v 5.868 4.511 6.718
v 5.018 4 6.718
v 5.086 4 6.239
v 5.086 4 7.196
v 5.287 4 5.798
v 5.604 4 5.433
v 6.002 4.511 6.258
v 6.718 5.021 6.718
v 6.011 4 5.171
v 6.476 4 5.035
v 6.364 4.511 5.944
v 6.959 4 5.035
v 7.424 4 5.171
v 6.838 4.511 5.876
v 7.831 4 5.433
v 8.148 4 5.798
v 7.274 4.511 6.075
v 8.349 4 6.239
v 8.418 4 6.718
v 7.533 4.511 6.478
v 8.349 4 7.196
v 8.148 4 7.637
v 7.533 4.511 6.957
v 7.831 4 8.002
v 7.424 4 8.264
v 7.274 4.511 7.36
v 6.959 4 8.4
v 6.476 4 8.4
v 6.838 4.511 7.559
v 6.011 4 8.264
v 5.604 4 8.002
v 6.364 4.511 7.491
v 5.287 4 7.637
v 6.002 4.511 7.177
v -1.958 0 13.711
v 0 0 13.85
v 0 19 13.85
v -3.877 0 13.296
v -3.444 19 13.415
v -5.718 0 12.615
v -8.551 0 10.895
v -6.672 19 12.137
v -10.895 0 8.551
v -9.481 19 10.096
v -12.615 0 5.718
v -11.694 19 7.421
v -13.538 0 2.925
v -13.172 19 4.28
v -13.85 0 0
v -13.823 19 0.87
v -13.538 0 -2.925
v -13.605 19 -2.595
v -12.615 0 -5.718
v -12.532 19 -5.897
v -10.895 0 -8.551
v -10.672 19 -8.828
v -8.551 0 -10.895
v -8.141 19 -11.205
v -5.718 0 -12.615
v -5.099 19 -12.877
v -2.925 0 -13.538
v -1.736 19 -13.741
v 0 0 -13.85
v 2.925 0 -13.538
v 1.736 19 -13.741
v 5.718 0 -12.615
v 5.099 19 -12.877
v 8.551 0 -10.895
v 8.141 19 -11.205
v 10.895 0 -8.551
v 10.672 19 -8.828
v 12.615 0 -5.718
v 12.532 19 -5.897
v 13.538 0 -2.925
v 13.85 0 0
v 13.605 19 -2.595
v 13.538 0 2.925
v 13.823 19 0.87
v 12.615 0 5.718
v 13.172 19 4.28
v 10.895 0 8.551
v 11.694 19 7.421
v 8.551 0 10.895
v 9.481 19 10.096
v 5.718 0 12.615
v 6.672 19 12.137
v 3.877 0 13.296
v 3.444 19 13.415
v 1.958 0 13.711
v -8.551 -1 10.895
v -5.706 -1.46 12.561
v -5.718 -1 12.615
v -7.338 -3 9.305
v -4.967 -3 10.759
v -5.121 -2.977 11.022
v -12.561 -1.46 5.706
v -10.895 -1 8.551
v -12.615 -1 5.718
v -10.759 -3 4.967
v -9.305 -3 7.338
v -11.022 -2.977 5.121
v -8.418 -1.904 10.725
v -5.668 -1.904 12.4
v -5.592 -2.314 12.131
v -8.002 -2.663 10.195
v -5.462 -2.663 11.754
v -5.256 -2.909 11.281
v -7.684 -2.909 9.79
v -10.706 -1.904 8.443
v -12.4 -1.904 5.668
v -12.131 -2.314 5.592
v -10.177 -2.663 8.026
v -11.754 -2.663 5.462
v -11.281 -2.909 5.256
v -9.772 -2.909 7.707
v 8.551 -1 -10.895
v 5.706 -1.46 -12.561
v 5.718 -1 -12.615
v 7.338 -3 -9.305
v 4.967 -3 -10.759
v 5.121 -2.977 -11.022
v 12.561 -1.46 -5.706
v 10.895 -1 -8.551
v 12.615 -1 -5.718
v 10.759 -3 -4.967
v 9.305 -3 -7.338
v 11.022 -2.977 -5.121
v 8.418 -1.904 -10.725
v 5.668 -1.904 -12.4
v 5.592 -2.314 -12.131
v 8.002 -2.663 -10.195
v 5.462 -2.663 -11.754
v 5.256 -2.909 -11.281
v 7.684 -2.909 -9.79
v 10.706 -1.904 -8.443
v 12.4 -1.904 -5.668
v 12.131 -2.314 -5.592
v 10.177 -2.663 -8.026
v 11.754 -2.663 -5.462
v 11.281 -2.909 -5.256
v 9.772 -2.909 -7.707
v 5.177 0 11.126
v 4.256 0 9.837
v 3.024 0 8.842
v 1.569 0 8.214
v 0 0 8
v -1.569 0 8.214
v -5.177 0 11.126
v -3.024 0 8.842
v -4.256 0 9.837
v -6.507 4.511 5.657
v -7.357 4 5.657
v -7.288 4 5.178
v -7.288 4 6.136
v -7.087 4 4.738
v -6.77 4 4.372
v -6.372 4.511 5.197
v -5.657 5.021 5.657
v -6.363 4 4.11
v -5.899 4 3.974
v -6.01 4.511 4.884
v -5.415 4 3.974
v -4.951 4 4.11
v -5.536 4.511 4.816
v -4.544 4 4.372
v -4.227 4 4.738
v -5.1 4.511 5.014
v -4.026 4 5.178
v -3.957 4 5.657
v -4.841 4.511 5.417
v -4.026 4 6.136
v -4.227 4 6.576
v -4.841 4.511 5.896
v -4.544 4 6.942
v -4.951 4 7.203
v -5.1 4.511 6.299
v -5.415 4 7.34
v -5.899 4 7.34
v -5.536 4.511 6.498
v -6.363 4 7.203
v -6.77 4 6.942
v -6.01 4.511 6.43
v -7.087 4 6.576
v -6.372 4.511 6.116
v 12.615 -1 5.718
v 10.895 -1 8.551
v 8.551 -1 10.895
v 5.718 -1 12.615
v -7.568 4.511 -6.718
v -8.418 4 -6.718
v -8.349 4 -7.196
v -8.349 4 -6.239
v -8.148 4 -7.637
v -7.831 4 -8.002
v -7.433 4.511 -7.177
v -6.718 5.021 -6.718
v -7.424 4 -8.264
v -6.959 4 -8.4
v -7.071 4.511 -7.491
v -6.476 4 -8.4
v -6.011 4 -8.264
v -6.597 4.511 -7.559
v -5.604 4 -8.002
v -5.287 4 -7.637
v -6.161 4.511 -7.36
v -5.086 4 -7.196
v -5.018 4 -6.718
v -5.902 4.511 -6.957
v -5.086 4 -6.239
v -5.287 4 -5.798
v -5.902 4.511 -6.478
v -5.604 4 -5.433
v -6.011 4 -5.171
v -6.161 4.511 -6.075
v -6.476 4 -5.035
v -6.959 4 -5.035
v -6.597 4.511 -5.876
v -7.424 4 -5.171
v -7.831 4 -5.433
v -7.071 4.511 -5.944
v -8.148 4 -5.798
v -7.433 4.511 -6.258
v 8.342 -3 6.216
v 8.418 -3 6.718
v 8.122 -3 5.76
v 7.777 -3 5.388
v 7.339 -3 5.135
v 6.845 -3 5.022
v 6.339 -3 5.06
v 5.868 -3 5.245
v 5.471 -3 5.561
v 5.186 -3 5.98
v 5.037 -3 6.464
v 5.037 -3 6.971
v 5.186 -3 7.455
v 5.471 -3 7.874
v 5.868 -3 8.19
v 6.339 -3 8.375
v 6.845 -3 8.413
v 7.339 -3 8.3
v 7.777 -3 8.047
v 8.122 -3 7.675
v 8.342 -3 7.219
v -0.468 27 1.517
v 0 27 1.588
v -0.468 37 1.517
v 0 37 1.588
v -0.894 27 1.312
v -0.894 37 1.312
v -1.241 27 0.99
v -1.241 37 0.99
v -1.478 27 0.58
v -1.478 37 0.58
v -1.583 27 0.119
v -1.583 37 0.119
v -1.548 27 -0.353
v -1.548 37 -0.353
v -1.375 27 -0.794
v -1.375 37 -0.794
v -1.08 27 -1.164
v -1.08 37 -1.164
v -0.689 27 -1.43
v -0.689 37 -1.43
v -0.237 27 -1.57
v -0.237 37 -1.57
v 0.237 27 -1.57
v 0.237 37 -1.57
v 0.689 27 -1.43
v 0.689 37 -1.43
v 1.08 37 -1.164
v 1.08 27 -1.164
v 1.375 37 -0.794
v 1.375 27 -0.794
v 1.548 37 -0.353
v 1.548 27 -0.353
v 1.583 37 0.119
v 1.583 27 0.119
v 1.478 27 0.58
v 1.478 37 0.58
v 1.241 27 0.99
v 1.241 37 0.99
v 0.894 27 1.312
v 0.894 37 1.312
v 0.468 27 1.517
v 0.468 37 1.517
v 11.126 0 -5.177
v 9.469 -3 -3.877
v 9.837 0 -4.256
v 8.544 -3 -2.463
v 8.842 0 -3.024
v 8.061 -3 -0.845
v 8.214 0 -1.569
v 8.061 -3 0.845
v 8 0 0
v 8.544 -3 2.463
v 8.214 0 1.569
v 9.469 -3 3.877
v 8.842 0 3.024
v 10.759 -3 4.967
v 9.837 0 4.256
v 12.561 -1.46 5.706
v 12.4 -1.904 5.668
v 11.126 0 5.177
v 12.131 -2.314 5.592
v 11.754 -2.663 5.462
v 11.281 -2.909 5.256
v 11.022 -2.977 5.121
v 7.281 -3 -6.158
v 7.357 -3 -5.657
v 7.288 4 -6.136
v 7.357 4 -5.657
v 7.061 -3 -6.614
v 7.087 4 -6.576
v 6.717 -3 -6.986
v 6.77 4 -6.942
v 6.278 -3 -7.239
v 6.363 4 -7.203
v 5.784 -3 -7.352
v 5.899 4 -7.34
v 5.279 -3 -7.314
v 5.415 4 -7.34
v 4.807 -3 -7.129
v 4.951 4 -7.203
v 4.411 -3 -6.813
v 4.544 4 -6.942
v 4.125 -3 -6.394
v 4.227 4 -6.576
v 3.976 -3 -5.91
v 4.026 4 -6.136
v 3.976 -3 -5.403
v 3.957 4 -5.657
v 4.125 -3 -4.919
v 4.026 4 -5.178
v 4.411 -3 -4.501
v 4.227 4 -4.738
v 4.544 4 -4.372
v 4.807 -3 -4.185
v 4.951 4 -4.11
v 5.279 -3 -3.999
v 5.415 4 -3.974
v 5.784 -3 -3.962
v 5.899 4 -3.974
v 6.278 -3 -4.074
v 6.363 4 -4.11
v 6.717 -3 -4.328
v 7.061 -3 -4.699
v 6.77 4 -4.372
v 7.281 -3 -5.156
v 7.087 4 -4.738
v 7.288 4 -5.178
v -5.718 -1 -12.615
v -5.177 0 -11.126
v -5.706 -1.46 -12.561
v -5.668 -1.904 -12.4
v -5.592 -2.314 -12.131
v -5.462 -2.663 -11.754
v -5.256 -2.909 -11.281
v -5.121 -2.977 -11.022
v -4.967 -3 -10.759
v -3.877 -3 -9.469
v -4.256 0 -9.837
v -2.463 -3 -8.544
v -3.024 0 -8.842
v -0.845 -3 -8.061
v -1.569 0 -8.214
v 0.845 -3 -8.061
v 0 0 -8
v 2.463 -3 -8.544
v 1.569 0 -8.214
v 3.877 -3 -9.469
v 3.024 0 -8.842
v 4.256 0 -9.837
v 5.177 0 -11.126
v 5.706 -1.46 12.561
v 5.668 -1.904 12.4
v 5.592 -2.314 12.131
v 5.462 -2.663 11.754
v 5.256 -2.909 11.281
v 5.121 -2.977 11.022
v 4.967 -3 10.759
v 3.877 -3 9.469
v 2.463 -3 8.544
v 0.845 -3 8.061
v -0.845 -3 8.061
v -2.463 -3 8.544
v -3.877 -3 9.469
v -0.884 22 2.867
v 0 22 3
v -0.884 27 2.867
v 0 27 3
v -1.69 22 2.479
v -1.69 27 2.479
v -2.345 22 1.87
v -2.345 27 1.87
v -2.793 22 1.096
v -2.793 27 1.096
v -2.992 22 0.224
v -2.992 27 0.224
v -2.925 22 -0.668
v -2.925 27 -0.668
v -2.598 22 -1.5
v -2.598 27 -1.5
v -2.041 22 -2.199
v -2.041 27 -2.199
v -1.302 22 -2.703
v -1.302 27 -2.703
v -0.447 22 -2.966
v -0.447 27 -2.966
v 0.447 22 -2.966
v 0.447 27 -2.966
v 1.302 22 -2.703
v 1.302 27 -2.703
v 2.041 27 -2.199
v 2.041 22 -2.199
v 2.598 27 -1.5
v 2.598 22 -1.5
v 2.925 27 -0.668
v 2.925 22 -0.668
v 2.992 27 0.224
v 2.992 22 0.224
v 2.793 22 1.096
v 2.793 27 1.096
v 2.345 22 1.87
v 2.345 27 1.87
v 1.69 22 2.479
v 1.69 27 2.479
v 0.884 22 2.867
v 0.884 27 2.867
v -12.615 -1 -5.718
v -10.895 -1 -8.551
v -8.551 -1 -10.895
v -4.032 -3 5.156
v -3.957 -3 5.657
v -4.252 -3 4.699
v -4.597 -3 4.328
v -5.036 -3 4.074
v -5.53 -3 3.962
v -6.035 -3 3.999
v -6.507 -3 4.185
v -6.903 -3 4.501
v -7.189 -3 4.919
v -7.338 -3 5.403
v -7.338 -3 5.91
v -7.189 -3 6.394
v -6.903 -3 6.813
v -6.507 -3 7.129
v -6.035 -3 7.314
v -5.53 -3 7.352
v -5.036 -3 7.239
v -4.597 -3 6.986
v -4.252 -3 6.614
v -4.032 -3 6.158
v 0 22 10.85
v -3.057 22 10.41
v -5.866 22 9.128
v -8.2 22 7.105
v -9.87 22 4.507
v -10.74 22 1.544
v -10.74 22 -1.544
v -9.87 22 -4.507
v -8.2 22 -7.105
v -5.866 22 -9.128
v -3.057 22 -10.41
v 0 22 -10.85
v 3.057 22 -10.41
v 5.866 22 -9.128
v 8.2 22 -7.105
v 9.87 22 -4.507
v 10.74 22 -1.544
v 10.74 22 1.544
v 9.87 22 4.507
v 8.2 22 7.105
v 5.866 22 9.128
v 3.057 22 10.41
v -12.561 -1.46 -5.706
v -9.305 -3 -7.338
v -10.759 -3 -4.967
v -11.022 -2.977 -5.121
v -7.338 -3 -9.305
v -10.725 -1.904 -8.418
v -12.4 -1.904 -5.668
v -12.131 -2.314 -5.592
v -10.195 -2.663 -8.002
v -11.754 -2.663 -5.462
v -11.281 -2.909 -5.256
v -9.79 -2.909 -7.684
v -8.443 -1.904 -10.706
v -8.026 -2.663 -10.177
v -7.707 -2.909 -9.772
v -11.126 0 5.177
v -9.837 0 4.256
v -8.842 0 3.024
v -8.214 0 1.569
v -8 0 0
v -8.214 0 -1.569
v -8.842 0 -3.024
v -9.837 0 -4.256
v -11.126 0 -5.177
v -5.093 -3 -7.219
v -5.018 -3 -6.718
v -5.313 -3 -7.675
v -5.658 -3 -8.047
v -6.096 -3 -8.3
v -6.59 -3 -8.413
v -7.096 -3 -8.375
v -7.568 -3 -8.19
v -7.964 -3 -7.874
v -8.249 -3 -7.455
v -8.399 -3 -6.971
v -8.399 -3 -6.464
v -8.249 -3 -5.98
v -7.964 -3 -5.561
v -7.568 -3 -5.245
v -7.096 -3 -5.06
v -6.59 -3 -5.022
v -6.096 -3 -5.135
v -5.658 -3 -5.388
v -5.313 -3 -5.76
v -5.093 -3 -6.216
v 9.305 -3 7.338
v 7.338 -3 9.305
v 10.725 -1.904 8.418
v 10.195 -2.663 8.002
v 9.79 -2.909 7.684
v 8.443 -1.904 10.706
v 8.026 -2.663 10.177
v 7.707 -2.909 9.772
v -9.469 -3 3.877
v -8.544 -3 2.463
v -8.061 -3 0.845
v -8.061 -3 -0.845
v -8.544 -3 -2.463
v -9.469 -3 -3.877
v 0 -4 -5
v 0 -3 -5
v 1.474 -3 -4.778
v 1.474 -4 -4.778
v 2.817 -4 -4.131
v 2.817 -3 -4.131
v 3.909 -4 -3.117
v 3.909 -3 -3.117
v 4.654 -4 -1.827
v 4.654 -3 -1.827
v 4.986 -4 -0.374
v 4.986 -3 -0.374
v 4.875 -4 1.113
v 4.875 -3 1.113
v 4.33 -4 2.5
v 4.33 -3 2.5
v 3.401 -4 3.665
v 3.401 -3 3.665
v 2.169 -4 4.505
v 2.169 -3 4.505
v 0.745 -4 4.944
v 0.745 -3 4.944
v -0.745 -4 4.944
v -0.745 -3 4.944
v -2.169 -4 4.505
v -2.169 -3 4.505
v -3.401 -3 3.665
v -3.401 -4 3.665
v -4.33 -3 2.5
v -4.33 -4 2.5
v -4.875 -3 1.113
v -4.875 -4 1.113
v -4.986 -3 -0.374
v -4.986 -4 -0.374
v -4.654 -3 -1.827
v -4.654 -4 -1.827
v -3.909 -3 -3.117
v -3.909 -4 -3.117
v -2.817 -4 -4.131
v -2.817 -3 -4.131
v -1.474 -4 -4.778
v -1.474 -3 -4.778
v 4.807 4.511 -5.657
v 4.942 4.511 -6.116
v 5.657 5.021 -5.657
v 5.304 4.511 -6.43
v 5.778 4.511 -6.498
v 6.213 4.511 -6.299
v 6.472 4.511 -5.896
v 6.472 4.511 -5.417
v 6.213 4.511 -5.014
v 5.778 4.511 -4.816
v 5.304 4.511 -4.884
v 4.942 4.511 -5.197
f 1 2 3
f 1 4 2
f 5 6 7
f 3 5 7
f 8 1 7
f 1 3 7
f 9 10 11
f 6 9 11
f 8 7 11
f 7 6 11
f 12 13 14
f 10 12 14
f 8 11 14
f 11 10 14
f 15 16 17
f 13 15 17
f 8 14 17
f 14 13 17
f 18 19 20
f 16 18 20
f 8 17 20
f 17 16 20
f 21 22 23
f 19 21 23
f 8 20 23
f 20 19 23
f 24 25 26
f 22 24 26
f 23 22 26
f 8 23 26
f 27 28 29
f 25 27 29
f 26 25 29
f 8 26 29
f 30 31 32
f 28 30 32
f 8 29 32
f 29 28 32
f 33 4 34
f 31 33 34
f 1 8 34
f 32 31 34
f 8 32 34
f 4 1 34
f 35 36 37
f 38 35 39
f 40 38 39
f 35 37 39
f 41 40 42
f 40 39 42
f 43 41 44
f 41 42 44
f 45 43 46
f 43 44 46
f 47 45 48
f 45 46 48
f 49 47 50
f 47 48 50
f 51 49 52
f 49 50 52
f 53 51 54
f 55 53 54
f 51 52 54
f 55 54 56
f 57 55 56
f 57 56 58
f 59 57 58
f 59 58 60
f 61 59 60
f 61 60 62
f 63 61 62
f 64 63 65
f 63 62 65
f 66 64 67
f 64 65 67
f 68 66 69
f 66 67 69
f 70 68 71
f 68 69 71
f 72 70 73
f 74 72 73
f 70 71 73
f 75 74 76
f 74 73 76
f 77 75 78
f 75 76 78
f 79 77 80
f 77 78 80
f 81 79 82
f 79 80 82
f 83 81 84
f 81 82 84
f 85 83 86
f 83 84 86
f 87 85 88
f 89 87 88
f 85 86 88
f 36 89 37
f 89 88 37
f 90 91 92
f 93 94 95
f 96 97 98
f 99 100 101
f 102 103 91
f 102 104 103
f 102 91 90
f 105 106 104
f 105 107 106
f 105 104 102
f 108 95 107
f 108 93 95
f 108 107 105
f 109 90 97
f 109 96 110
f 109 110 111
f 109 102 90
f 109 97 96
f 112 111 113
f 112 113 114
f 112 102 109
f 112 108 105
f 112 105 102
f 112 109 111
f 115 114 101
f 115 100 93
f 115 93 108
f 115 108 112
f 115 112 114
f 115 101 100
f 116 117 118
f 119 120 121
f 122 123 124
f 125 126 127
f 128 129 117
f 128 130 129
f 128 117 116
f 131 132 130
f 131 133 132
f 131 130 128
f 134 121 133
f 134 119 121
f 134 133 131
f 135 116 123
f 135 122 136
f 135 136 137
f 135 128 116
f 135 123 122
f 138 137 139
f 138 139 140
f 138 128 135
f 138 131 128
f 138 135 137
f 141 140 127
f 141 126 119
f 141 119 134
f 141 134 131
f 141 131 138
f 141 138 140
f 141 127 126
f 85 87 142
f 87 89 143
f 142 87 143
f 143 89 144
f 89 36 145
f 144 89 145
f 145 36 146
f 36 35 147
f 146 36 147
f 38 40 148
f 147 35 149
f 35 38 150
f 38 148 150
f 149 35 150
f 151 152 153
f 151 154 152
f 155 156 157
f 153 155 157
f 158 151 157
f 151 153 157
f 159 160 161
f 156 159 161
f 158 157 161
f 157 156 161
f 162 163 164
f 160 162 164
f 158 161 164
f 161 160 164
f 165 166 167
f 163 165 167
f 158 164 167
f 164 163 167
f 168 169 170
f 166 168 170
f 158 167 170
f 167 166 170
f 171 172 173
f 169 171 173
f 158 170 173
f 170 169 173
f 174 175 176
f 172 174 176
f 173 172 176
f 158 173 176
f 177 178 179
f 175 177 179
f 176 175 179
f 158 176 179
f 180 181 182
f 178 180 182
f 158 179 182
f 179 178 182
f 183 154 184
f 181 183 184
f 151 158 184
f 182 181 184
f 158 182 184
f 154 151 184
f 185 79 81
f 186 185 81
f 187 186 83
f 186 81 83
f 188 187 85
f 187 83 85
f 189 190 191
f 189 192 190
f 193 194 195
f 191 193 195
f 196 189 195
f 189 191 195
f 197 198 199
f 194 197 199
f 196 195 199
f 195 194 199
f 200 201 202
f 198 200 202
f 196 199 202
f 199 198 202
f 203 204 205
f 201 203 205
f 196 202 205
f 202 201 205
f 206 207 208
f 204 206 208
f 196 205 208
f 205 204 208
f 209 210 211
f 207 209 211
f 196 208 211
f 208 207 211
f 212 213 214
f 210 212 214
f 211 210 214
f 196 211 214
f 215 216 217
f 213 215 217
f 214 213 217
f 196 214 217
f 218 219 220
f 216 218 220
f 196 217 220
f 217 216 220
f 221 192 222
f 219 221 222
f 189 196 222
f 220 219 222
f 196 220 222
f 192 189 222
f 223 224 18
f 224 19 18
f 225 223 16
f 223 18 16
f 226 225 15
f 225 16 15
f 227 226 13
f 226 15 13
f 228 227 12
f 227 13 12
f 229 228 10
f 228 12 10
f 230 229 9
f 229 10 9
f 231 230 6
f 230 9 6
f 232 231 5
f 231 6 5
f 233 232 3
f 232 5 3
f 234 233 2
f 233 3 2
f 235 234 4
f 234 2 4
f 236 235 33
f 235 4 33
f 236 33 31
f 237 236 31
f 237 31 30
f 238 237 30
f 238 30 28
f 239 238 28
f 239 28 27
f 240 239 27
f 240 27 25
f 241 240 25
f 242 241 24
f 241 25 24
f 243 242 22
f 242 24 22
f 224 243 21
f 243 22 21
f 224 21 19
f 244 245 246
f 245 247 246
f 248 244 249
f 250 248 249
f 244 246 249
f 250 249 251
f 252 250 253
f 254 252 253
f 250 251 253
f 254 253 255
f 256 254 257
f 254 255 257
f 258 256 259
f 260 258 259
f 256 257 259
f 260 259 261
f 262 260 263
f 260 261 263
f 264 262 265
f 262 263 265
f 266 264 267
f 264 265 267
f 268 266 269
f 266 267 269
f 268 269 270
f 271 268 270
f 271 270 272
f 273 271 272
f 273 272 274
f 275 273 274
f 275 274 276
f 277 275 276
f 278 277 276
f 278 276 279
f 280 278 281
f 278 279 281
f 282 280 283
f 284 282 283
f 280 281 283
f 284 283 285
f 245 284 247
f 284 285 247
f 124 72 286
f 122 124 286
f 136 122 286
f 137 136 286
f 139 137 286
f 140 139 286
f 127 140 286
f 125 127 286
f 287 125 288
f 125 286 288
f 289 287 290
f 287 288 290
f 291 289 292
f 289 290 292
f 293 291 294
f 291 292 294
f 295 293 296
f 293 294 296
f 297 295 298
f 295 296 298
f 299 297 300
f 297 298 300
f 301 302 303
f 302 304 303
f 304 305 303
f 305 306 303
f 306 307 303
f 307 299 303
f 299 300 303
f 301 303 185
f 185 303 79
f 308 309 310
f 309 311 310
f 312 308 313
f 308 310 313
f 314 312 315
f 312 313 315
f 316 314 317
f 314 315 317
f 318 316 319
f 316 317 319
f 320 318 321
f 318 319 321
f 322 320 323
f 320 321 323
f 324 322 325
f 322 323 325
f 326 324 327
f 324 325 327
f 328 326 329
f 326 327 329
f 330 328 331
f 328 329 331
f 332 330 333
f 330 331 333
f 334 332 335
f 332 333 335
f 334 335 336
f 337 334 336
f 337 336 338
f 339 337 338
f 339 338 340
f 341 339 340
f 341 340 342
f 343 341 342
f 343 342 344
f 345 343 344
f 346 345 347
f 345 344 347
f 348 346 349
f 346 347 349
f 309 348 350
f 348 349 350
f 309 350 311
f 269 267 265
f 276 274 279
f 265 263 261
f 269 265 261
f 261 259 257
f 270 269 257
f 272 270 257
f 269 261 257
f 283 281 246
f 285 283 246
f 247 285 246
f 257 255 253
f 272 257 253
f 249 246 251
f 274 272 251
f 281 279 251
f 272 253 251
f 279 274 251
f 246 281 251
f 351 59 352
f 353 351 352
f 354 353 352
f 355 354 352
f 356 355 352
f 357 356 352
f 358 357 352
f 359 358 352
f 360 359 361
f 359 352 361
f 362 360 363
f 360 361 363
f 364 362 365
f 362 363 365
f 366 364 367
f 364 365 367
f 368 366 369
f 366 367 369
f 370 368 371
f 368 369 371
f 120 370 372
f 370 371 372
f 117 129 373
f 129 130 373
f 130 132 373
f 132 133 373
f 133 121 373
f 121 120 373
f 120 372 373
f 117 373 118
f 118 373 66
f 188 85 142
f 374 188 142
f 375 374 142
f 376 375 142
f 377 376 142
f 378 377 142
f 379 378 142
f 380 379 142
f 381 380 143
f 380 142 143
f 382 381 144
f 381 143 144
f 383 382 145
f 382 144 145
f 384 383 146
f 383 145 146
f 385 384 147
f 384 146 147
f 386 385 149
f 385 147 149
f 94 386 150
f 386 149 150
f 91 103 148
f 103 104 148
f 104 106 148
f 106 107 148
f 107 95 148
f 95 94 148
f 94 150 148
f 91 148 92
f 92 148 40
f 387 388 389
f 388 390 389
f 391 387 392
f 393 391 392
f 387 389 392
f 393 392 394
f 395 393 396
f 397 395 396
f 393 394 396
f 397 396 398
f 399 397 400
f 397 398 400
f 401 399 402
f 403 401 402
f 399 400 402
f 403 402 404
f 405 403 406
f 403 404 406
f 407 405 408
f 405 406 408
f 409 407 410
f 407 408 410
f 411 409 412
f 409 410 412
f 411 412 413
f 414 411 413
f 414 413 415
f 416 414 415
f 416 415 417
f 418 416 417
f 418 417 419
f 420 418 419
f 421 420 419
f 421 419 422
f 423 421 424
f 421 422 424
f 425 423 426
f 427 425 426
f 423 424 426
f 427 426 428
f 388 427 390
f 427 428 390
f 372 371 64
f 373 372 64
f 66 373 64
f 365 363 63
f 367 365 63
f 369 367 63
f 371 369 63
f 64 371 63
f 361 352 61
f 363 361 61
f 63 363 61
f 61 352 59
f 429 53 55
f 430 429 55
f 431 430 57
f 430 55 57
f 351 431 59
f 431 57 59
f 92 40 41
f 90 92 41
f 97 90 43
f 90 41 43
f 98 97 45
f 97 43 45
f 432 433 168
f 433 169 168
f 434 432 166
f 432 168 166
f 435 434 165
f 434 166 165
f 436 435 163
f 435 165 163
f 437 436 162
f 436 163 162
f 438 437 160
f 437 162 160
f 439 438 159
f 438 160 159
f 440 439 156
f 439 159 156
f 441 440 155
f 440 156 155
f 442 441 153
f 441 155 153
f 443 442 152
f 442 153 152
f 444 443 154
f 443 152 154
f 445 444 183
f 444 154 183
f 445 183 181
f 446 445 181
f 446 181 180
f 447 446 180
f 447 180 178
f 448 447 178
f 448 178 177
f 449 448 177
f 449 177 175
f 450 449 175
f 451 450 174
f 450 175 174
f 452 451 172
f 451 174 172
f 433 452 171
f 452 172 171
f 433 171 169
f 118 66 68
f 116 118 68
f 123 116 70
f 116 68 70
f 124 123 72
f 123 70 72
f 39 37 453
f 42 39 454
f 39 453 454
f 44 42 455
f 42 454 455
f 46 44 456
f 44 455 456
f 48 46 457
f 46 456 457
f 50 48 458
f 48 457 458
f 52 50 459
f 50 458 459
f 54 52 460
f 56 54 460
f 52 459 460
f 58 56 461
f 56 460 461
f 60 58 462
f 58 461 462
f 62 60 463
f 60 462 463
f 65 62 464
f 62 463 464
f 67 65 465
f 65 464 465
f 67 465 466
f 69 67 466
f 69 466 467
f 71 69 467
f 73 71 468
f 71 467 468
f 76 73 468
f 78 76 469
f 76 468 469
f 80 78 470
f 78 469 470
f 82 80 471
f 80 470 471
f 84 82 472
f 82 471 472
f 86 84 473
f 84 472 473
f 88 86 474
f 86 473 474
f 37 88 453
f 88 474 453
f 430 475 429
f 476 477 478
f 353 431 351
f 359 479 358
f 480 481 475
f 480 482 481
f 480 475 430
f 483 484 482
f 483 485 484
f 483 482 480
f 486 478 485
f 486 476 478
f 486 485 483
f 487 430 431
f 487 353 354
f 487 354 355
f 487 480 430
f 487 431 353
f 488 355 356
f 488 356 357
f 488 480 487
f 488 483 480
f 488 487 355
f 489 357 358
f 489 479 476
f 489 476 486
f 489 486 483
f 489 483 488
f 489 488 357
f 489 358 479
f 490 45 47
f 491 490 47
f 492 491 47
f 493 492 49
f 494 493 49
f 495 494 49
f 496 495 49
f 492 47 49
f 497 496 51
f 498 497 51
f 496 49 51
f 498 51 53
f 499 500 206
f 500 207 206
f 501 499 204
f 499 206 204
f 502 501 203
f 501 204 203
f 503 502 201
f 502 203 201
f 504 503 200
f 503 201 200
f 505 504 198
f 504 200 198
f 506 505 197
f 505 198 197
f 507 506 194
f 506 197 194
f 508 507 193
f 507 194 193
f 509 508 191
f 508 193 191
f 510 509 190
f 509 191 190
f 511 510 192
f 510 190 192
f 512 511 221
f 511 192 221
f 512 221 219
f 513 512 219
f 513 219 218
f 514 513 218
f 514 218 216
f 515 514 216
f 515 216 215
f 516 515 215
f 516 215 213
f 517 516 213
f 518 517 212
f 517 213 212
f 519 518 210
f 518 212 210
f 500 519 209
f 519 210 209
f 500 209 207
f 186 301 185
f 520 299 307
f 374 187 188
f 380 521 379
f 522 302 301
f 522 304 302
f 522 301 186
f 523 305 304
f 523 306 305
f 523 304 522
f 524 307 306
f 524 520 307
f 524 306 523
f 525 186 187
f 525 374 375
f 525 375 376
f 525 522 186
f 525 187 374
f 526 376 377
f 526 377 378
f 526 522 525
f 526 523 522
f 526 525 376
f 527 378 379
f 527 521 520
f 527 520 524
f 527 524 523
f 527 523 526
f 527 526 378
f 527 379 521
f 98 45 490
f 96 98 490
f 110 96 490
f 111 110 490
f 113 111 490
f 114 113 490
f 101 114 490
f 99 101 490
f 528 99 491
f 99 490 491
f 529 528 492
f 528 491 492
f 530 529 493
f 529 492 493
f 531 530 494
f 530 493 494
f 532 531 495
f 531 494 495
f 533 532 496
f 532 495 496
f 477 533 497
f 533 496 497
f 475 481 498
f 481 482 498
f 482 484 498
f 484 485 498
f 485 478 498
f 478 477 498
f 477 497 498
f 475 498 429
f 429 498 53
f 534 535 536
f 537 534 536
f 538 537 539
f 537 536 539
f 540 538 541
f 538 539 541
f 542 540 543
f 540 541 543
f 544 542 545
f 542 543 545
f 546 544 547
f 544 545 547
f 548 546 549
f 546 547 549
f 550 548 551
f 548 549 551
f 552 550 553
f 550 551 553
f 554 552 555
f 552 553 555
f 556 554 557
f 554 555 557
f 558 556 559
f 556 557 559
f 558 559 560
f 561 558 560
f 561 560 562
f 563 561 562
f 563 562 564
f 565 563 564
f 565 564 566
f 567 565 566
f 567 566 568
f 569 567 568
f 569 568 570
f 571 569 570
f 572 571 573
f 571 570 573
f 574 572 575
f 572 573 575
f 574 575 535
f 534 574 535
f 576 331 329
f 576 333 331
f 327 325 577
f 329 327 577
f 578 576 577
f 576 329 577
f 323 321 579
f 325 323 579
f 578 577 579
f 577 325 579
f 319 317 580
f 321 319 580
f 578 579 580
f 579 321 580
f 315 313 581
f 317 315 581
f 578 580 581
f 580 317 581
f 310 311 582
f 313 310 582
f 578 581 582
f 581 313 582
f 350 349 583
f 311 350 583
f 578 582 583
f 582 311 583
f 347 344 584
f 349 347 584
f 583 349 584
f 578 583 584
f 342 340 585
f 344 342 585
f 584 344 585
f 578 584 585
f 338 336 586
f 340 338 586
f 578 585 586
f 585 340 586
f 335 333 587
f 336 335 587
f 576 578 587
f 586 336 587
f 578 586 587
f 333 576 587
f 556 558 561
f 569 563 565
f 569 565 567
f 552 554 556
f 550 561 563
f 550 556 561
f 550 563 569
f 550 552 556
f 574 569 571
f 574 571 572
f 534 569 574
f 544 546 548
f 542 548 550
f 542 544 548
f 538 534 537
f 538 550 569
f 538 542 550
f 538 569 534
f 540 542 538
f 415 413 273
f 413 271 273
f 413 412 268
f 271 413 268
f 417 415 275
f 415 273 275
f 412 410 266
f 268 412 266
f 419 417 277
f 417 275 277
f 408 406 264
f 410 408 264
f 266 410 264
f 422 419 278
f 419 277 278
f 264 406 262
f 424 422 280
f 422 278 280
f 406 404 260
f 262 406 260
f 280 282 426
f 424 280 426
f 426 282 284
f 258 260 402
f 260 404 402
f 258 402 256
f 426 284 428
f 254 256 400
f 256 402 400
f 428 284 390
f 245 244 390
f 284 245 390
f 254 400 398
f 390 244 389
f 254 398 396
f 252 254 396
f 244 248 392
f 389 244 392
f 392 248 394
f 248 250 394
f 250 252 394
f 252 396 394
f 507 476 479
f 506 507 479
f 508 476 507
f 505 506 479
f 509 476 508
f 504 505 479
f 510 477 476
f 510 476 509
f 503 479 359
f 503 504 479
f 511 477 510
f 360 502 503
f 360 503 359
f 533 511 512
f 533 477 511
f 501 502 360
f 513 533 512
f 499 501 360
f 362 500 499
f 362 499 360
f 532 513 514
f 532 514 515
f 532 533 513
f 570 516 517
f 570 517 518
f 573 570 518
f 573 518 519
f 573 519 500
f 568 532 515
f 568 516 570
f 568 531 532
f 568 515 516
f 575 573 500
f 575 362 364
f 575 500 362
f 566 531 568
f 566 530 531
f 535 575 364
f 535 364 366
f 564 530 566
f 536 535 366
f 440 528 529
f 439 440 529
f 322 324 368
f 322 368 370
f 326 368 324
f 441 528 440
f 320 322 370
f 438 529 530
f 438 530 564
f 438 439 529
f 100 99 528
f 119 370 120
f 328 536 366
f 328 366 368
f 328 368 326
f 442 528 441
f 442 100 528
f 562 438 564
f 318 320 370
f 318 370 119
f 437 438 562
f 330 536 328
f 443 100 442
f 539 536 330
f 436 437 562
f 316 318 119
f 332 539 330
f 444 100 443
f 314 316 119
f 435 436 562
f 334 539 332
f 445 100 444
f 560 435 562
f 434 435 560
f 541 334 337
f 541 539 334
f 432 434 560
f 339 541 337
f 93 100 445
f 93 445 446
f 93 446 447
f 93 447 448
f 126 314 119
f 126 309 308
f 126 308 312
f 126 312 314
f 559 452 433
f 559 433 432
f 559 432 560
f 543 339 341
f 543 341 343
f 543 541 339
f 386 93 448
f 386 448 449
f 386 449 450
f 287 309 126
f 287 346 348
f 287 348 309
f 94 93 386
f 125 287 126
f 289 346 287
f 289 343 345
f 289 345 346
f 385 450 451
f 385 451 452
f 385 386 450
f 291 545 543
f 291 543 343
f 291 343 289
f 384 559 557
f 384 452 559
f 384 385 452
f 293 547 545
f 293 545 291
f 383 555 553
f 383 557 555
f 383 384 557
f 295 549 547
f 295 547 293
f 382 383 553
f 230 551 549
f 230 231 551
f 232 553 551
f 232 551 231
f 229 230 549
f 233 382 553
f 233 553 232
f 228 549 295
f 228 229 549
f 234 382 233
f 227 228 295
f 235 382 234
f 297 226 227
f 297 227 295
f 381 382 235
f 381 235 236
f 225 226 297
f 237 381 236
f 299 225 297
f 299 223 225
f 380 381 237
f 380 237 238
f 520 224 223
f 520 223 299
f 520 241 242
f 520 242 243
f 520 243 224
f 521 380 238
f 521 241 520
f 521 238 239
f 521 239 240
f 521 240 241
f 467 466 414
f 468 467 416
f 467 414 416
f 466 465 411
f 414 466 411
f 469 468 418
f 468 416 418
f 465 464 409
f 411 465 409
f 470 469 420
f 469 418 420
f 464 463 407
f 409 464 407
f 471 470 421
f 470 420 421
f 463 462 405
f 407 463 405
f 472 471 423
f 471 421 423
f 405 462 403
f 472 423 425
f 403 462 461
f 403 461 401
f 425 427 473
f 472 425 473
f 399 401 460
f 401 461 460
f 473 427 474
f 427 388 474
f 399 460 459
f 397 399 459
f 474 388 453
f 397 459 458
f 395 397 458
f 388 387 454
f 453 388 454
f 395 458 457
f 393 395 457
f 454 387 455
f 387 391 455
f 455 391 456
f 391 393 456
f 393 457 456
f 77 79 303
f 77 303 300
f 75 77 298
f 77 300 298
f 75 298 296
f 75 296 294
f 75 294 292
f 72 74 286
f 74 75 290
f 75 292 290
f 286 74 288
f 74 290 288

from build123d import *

# Parameters (mm, degrees)
EXTRUDE_1_DEPTH        = 3
FILLET_1_R             = 2
HOLE_WIZARD_M3_1_D     = 3.4
HOLE_WIZARD_M3_1_DEPTH = 7
HOLE_WIZARD_M3_1_TIP   = 1.021463052
SKETCH_10_R            = 5
EXTRUDE_2_DEPTH        = 1


with BuildPart() as part:
    # 스케치1 → 회전1 (revolve)
    with BuildSketch(Plane.XY, mode=Mode.PRIVATE) as revolve_1_sk:
        Polygon((0, 0), (13.85, 0), (13.85, 19), (10.85, 22), (3, 22), (3, 27), (1.5875, 27), (1.5875, 37), (0, 37), align=None)
    revolve(revolve_1_sk.sketch.rotate(Axis((0, 0, 0), (0, -1, 0)), 90), axis=Axis((0, 0, 0), (0, -1, 0)))

    # 스케치2 → 보스-돌출1 (add)
    with BuildSketch(Plane.XZ):
        with BuildLine():
            ThreePointArc((12.614530686, -5.718051729), (8, 0), (12.614530686, 5.718051729))
            ThreePointArc((12.614530686, 5.718051729), (9.793428919, 9.793428919), (5.718051729, 12.614530686))
            ThreePointArc((5.718051729, 12.614530686), (0, 8), (-5.718051729, 12.614530686))
            ThreePointArc((-5.718051729, 12.614530686), (-9.793428919, 9.793428919), (-12.614530686, 5.718051729))
            ThreePointArc((-12.614530686, 5.718051729), (-8, 0), (-12.614530686, -5.718051729))
            ThreePointArc((-12.614530686, -5.718051729), (-9.793428919, -9.793428919), (-5.718051729, -12.614530686))
            ThreePointArc((-5.718051729, -12.614530686), (0, -8), (5.718051729, -12.614530686))
            ThreePointArc((5.718051729, -12.614530686), (9.793428919, -9.793428919), (12.614530686, -5.718051729))
        make_face()
    extrude(amount=EXTRUDE_1_DEPTH)

    # 필렛1
    fillet_1_edges = [part.edges().sort_by_distance(p)[0] for p in [
        (-9.793428919, -3, -9.793428919),
        (9.793428919, -3, -9.793428919),
        (9.793428919, -3, 9.793428919),
        (-9.793428919, -3, 9.793428919),
    ]]
    fillet(fillet_1_edges, radius=FILLET_1_R)

    # M3 여유 구멍1
    with Locations(Plane(origin=(0, -3, 0), x_dir=(-1, 0, 0), z_dir=(0, -1, 0))):
        with Locations((5.656854249, -5.656854249), (-5.656854249, 5.656854249), (-6.717514421, -6.717514421), (6.717514421, 6.717514421)):
            Hole(HOLE_WIZARD_M3_1_D / 2, depth=HOLE_WIZARD_M3_1_DEPTH)
            with Locations((0, 0, -(HOLE_WIZARD_M3_1_DEPTH + HOLE_WIZARD_M3_1_TIP / 2))):  # 118° drill point
                Cone(0, HOLE_WIZARD_M3_1_D / 2, HOLE_WIZARD_M3_1_TIP, mode=Mode.SUBTRACT)

    # 스케치10 → 보스-돌출2 (add)
    with BuildSketch(Plane.XZ.offset(3)):
        with Locations(Location((0, 0, 0), (0, 0, 270))):
            Circle(SKETCH_10_R)
    extrude(amount=EXTRUDE_2_DEPTH)


solid = part.part
